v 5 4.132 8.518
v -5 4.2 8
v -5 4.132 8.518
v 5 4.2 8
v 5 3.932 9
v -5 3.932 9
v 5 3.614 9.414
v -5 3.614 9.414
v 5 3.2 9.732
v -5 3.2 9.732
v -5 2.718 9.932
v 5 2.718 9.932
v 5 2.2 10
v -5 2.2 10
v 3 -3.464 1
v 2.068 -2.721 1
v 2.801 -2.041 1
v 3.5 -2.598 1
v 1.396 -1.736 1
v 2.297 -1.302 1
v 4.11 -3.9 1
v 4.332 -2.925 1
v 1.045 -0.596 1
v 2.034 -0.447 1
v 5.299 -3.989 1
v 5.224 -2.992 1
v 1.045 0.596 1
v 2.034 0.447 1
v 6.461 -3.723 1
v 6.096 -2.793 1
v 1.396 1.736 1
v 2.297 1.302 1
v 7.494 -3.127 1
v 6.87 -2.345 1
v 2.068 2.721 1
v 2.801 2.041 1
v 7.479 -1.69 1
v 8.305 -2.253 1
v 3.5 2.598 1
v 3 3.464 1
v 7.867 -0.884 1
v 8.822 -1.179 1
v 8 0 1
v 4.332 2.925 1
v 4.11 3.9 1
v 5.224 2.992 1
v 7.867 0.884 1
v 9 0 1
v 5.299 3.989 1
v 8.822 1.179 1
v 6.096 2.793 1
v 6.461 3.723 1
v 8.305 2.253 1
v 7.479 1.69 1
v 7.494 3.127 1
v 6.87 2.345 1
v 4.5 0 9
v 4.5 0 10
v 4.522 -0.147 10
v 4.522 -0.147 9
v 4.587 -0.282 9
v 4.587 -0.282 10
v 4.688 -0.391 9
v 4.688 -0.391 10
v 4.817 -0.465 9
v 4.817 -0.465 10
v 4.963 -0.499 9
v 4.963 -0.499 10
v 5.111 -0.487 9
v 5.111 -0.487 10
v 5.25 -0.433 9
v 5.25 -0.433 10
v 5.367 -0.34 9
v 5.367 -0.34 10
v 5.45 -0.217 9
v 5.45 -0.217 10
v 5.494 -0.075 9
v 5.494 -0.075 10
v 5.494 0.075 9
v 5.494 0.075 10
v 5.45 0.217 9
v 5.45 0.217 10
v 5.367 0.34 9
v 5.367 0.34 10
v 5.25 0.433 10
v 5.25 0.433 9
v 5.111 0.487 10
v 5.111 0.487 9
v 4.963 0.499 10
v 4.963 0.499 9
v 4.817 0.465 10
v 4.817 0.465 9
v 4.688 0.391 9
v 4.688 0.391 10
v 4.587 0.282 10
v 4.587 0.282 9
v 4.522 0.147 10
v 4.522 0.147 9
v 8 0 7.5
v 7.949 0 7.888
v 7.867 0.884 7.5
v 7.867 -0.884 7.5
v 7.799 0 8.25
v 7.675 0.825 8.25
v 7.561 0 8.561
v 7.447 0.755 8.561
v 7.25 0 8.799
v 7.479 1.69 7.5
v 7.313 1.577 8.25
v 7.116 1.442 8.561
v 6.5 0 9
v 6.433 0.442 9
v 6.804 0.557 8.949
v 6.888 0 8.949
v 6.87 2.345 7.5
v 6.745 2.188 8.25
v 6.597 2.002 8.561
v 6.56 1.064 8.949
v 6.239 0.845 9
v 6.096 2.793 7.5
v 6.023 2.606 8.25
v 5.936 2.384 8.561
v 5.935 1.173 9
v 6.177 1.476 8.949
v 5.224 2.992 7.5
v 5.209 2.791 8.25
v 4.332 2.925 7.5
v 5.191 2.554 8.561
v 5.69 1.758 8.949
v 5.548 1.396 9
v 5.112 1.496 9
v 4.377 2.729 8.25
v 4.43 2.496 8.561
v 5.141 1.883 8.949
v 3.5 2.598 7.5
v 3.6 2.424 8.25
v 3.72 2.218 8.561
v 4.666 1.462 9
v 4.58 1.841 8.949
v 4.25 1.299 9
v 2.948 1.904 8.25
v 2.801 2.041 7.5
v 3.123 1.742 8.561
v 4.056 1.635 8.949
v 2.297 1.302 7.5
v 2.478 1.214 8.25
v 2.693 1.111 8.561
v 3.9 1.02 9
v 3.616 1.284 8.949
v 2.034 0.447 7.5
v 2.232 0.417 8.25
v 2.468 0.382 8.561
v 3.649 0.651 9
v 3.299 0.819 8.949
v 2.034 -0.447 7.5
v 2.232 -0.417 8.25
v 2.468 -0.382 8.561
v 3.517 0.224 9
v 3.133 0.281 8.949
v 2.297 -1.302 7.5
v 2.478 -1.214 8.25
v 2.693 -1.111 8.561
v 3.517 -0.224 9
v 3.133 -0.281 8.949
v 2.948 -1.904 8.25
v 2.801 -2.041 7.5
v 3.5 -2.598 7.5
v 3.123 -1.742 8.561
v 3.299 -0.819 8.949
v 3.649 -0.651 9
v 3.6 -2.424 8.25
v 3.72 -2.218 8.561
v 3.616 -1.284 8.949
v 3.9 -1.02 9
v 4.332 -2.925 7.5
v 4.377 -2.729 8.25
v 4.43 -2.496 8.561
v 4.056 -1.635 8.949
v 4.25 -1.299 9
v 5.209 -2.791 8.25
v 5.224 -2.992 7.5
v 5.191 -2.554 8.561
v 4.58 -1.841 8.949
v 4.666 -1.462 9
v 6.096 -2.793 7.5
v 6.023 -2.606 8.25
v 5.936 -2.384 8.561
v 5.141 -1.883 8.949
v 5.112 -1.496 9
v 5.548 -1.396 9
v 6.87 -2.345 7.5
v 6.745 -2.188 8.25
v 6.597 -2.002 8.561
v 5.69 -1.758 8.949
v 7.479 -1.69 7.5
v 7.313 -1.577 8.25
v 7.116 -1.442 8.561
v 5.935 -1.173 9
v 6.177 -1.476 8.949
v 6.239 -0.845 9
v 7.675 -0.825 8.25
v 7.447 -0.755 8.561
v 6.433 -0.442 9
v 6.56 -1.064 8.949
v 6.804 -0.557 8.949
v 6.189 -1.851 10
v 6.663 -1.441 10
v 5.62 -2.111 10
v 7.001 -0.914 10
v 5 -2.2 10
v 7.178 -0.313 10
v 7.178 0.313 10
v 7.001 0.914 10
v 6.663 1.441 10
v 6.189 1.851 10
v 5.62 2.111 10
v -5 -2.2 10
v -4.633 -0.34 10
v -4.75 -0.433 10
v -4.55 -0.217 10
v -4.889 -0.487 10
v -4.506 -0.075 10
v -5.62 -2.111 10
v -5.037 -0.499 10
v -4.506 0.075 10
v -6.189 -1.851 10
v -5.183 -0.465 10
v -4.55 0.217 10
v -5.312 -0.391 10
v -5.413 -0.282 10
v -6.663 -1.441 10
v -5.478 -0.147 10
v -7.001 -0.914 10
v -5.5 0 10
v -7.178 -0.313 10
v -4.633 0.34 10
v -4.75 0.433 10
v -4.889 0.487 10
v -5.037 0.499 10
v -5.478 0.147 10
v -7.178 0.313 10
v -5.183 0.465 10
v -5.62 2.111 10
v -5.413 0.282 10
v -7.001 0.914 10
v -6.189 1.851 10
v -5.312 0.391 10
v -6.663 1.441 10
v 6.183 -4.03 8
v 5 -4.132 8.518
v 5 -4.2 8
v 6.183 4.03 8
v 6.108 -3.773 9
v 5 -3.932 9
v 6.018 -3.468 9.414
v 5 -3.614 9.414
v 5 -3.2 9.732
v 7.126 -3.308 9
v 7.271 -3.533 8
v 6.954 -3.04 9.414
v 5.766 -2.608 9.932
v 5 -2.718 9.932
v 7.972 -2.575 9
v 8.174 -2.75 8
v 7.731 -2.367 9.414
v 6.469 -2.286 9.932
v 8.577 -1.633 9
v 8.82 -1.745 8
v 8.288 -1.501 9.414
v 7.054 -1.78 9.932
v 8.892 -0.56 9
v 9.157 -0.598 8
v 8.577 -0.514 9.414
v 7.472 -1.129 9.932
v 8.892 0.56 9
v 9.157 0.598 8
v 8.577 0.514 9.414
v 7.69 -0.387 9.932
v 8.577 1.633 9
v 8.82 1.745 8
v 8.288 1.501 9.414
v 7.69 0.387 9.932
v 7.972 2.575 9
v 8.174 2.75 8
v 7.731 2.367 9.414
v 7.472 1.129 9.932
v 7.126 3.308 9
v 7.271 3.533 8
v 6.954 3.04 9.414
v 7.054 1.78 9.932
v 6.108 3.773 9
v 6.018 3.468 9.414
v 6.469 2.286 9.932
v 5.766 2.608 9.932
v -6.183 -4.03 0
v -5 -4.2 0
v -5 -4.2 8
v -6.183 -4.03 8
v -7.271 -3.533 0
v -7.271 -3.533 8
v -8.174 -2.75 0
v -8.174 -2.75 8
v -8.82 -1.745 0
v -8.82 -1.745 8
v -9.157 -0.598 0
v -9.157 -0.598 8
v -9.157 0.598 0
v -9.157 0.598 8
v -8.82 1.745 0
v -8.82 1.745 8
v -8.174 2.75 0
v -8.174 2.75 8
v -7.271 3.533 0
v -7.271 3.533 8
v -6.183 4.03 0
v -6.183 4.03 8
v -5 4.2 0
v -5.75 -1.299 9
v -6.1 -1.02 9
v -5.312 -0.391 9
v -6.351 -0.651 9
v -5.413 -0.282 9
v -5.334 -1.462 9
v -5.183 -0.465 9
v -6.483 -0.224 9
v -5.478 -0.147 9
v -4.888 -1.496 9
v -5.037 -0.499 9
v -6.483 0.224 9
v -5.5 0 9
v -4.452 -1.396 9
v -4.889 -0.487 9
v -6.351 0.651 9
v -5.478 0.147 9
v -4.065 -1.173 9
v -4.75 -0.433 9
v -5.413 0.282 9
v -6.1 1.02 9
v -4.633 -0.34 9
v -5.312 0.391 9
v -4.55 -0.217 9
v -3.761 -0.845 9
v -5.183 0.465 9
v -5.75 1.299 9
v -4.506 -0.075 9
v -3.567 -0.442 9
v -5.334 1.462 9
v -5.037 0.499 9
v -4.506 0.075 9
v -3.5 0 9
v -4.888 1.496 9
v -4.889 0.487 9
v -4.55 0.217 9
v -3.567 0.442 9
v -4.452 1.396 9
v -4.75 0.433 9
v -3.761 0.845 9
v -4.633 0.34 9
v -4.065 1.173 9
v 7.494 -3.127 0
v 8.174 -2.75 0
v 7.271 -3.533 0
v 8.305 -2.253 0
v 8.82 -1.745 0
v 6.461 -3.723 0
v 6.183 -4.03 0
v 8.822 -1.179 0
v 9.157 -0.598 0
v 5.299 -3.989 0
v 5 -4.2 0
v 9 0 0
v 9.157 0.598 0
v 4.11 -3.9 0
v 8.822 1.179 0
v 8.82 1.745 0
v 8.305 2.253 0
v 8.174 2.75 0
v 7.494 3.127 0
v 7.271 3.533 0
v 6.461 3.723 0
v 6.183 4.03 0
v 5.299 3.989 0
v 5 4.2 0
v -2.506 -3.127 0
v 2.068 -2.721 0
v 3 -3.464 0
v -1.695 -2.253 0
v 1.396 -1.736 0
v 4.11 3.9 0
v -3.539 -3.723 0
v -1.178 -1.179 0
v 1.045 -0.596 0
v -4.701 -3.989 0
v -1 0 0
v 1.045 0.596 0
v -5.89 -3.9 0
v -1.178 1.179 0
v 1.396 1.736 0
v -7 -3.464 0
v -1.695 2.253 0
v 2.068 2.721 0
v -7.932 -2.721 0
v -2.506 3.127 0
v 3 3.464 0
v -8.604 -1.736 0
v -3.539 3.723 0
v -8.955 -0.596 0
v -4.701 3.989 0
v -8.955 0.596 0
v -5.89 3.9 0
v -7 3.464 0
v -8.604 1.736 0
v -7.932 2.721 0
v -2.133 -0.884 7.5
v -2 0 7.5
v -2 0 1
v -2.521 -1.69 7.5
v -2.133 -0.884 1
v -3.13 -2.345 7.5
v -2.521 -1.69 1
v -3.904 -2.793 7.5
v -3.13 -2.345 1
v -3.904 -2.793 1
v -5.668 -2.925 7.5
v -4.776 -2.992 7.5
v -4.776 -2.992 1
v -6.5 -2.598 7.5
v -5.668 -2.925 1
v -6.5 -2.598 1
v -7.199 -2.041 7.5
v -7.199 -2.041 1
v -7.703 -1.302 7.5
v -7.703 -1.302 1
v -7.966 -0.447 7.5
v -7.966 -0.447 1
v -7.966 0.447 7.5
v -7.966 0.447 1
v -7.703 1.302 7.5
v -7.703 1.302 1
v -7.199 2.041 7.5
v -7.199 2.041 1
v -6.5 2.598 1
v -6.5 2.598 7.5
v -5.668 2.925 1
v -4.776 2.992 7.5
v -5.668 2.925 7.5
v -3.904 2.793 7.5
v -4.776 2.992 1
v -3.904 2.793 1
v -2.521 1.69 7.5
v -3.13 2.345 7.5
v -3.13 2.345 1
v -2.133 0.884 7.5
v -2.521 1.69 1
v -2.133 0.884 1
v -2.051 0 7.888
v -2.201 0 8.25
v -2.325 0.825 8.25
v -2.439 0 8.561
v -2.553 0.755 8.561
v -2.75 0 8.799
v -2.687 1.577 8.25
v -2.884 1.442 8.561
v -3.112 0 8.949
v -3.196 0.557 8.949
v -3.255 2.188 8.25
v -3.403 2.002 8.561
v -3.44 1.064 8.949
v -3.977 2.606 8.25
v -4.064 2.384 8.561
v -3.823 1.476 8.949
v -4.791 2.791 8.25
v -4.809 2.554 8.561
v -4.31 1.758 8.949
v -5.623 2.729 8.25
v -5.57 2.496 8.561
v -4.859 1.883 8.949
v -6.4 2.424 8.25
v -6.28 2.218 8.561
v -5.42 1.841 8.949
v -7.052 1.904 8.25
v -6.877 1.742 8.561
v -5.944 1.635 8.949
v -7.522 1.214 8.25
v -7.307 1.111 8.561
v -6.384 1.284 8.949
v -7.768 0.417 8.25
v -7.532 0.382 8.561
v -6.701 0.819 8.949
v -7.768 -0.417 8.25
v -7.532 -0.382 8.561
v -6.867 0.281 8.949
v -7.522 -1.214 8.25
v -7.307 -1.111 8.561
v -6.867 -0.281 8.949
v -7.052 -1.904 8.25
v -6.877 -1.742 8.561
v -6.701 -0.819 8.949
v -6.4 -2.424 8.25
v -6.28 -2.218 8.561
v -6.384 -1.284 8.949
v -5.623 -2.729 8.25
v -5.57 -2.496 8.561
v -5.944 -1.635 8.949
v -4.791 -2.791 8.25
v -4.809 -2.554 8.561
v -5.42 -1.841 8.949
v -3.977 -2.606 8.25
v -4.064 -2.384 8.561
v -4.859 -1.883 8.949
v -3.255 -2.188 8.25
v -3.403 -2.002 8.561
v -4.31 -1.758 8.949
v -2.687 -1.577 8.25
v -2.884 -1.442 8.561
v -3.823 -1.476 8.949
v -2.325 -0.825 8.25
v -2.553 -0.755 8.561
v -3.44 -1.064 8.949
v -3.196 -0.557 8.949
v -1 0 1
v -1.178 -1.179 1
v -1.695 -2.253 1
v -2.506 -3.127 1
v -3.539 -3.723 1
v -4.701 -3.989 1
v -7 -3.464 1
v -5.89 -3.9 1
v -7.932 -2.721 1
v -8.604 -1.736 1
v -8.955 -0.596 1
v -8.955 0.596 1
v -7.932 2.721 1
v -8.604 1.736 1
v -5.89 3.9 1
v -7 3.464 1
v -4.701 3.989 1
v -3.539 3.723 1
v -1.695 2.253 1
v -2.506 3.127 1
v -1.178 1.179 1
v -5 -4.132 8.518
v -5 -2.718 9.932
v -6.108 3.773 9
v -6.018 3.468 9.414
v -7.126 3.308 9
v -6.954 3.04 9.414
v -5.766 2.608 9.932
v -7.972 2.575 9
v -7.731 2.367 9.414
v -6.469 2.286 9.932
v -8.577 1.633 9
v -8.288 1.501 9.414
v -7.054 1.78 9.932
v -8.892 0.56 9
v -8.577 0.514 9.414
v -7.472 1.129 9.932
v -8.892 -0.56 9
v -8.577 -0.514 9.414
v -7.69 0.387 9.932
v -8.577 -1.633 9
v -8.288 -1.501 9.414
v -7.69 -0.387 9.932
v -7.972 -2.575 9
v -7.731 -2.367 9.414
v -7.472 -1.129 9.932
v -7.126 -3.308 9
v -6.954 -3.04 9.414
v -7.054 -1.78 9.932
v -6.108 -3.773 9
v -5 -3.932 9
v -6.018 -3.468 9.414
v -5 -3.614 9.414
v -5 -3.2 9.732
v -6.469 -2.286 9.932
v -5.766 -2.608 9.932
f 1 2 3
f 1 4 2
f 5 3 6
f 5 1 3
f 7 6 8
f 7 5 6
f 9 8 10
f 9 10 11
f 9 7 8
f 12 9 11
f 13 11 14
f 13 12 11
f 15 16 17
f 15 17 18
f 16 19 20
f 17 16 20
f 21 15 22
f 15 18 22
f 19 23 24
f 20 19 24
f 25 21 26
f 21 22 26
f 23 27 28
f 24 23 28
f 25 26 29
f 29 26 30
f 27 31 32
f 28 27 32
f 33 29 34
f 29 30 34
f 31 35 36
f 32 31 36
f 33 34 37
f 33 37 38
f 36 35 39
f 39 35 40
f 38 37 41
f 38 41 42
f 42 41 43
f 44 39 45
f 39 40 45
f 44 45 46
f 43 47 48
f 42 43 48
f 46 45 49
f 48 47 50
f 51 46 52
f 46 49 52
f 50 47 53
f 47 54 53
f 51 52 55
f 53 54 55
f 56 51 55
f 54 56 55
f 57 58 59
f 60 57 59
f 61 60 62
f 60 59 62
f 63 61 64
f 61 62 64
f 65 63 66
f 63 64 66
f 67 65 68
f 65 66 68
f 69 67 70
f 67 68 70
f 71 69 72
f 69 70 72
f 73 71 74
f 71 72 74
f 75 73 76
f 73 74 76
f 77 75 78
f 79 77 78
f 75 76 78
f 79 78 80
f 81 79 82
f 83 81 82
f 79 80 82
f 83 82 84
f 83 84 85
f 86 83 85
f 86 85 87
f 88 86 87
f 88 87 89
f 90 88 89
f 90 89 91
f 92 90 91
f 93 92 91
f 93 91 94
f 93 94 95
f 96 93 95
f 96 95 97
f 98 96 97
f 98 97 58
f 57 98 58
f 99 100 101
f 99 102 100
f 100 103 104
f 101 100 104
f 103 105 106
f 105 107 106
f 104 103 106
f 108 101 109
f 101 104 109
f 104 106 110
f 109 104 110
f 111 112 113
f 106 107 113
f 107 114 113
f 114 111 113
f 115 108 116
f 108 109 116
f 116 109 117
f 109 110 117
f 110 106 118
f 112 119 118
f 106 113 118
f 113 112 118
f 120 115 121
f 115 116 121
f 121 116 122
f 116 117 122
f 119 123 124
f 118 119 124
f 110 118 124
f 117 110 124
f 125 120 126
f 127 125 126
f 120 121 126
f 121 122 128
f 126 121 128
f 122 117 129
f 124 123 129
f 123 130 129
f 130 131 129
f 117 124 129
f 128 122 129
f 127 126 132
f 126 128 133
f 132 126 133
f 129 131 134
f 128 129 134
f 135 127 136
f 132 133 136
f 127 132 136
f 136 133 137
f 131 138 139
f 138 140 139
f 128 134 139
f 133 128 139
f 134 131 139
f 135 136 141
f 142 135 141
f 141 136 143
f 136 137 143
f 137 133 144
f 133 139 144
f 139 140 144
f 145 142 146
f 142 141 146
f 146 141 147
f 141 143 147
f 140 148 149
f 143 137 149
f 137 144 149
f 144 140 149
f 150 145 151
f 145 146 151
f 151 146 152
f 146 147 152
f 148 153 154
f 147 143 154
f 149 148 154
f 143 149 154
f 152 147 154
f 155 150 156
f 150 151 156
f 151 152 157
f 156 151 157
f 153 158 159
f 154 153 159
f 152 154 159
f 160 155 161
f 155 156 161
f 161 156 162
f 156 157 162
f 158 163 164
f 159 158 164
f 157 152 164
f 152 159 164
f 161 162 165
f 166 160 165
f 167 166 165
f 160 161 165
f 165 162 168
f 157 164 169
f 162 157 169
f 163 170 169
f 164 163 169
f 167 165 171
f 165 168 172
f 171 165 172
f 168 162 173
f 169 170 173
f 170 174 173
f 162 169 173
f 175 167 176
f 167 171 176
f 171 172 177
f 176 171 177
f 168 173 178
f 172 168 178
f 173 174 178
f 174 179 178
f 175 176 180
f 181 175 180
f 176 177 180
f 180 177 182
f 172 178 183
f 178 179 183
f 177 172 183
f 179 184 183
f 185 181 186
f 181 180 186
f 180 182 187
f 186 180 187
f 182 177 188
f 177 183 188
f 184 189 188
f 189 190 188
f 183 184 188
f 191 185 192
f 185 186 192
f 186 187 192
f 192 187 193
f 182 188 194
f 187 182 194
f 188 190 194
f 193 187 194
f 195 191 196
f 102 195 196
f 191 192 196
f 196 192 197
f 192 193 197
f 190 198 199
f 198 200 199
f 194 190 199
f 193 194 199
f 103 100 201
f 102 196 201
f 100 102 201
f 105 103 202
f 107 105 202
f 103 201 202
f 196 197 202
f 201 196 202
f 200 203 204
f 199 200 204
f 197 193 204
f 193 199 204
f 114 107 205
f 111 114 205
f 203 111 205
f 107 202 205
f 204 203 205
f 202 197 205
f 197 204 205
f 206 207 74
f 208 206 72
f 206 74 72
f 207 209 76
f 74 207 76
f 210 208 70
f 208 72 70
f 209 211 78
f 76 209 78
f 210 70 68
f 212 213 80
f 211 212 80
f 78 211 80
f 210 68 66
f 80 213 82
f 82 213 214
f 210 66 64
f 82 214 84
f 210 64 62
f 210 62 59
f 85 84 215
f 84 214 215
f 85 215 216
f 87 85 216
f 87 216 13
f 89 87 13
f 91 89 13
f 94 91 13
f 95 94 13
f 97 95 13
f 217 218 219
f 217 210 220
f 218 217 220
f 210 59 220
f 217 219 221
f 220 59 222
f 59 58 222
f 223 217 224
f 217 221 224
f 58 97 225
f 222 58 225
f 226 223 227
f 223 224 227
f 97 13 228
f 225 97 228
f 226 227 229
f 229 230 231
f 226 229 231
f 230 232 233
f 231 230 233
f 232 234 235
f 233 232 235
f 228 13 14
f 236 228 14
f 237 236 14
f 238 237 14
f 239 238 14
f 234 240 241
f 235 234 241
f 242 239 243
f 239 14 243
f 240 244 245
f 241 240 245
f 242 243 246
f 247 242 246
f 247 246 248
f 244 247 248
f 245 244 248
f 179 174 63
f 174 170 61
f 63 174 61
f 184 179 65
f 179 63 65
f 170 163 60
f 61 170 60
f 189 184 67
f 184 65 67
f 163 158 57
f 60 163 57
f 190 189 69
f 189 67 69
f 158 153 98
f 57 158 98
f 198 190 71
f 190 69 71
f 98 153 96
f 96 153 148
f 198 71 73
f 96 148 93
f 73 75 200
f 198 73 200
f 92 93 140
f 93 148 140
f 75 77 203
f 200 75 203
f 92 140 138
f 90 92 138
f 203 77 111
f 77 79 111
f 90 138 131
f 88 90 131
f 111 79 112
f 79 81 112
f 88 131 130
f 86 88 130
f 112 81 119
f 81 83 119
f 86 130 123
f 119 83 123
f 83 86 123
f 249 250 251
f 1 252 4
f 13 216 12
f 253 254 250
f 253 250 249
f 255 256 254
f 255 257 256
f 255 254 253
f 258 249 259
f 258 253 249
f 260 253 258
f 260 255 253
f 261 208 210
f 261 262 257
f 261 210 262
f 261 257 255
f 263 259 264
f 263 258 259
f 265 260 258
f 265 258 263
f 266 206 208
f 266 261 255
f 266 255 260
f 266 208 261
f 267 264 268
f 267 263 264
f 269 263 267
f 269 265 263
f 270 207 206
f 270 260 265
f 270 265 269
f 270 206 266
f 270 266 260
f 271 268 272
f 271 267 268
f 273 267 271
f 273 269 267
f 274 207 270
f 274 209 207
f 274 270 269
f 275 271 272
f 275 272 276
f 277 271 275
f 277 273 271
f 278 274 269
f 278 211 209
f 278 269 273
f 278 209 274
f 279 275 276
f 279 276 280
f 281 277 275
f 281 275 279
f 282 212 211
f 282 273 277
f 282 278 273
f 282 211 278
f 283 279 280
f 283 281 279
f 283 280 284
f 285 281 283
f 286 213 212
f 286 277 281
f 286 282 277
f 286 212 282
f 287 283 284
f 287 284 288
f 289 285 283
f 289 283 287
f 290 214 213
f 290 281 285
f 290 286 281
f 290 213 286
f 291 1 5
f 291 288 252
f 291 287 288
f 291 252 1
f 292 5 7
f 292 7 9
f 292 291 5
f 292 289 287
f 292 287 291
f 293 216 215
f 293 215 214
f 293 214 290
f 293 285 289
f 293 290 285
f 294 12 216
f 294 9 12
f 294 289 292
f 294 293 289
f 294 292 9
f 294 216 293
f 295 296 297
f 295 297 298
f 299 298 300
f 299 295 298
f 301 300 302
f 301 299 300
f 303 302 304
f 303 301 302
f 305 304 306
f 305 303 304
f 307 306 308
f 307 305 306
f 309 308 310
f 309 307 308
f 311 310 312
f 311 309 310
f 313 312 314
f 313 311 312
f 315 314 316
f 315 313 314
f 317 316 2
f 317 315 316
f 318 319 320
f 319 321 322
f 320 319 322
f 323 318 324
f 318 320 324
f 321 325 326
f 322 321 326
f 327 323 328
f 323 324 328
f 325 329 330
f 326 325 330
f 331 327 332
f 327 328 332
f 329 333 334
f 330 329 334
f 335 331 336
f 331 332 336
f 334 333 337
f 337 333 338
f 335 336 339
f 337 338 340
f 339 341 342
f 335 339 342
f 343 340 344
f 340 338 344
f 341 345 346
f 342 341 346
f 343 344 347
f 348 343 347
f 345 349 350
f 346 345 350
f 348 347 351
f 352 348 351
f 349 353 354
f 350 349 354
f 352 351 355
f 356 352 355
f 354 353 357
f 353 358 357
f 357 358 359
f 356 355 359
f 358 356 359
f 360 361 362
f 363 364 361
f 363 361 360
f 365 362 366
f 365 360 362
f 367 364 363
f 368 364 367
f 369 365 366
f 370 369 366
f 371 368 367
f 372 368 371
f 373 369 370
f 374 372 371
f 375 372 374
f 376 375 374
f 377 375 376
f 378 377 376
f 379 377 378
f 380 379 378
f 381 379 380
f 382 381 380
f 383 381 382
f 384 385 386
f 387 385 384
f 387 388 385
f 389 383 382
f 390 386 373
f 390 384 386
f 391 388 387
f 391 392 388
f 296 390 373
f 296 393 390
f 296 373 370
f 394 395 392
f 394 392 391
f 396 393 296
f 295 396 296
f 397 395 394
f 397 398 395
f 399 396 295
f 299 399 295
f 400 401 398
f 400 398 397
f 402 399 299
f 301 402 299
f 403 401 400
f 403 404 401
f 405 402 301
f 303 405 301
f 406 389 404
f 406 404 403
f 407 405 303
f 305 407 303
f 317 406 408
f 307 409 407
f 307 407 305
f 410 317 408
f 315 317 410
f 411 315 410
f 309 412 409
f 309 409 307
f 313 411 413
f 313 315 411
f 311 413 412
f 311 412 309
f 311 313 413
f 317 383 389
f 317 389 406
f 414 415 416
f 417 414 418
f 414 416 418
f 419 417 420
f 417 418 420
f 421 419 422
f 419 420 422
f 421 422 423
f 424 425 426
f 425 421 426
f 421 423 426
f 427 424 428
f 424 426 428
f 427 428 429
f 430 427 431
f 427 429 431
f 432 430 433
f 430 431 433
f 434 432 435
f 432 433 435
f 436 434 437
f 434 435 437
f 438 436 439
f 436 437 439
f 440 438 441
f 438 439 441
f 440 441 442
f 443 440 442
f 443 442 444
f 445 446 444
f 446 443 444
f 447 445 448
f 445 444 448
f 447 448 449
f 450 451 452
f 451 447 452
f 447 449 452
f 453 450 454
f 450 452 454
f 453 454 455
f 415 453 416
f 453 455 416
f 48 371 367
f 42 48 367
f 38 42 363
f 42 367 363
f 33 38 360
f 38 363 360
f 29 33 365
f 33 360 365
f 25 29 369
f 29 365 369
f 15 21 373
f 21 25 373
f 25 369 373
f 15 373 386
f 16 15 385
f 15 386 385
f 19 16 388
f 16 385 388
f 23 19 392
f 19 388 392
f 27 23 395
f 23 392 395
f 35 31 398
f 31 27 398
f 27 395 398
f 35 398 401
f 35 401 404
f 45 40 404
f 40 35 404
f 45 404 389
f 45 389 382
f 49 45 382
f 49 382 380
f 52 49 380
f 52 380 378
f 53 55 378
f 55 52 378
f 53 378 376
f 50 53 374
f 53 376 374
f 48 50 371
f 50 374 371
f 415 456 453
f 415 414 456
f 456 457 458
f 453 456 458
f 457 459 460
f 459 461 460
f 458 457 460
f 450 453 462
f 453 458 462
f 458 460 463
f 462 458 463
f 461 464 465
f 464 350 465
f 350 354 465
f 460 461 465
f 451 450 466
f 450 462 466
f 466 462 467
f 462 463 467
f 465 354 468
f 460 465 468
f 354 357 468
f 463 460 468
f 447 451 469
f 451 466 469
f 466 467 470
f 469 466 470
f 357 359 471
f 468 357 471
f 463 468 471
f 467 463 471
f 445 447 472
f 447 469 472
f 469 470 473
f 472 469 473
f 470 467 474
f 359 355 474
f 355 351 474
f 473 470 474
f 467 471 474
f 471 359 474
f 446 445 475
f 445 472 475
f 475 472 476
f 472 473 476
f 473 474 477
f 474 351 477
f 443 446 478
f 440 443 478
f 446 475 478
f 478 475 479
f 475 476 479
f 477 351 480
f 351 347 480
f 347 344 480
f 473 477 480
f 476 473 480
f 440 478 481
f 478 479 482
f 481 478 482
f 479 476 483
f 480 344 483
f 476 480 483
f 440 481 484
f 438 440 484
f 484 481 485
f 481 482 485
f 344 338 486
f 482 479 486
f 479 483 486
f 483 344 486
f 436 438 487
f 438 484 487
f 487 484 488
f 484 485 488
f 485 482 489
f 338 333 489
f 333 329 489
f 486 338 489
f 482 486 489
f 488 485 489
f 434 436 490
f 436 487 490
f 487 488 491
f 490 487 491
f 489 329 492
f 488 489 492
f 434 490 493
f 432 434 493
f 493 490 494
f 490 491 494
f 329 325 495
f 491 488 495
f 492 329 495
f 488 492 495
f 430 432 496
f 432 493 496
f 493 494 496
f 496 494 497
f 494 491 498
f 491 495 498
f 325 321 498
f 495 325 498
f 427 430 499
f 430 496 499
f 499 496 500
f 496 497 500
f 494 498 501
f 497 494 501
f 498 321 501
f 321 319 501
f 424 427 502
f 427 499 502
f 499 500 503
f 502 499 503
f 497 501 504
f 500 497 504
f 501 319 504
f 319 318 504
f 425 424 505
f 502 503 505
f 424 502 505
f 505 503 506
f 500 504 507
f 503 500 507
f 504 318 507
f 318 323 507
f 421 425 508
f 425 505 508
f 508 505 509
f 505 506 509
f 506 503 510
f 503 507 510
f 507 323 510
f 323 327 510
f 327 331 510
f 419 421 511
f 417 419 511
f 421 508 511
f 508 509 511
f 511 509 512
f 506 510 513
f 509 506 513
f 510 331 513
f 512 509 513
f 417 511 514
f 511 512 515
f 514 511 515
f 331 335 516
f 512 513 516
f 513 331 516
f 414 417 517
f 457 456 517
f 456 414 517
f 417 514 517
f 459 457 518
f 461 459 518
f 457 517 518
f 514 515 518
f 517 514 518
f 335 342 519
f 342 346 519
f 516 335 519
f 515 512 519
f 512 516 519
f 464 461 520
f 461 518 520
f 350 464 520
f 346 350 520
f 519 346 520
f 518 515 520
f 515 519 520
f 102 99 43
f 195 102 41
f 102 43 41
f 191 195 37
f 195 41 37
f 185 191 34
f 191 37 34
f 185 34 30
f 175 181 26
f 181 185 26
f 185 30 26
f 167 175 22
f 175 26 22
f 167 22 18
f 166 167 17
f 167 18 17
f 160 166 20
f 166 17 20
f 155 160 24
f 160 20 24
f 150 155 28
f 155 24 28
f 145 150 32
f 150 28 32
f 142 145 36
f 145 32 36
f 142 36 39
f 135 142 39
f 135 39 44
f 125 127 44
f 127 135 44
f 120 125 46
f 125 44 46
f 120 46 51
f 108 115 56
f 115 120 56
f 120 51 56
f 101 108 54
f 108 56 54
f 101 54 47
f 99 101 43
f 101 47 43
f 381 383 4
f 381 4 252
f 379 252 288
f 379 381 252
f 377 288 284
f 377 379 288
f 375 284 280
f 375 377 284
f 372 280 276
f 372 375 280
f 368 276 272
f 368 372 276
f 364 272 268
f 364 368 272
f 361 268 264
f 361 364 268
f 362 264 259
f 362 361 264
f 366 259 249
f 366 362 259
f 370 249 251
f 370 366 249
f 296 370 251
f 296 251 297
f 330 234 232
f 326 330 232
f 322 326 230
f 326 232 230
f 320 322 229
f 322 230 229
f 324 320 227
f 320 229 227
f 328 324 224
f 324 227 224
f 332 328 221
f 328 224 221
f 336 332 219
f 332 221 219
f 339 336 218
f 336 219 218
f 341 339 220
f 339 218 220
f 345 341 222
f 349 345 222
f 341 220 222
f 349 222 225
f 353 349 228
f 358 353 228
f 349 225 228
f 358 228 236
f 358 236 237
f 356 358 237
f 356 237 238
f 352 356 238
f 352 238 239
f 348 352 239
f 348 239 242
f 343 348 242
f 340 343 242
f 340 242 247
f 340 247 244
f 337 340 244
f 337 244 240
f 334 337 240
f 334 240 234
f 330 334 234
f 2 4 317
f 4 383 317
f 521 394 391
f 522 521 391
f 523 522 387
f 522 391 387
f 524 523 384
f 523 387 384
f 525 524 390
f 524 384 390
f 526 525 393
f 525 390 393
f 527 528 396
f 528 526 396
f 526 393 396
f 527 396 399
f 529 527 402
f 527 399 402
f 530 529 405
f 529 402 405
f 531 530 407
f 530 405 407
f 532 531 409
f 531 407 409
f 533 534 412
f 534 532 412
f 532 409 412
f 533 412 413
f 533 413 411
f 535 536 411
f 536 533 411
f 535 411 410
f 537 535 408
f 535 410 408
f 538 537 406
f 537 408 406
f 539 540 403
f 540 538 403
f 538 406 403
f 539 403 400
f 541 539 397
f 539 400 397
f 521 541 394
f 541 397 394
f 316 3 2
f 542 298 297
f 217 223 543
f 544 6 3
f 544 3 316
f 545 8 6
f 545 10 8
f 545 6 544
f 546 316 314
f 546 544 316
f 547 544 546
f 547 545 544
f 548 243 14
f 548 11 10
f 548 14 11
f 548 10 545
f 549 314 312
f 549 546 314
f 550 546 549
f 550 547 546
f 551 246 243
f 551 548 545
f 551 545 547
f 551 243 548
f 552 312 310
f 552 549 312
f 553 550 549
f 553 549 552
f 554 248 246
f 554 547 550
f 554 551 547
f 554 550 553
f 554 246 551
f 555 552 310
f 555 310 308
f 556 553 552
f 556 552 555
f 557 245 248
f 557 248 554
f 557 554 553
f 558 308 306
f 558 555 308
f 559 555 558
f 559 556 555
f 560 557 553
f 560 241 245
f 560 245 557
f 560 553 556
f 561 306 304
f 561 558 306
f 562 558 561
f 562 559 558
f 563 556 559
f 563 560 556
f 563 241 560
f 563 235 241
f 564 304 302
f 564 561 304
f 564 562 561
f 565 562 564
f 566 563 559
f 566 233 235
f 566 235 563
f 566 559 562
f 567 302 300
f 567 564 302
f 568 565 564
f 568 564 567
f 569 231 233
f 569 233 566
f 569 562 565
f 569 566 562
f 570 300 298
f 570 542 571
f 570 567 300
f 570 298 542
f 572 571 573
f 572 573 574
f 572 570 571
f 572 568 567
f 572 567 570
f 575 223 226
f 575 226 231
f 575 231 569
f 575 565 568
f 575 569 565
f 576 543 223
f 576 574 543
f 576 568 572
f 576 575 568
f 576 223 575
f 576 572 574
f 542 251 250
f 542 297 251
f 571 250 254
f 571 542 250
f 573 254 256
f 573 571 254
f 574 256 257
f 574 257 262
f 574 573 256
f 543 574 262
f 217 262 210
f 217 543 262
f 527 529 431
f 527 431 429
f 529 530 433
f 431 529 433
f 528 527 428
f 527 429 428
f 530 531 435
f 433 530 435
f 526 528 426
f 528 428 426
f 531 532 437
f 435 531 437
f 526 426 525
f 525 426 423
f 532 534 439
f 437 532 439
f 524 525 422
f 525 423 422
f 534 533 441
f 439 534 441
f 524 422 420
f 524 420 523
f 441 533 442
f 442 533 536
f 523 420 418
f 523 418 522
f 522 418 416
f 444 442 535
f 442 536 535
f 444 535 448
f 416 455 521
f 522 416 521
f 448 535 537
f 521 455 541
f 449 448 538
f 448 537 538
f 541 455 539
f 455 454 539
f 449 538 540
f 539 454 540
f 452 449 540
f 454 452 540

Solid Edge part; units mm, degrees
sketch "Sketch1" plane through (0, 0, 0) normal (0, 0, 1) x (1, 0, 0)
  line L0 (5, -4.2) -> (-5, -4.2)
  line L1 (5, 4.2) -> (-5, 4.2)
  arc A0 (-5, -4.2) -> (-5, 4.2) centre (-5, 0) cw
  arc A1 (5, 4.2) -> (5, -4.2) centre (5, 0) cw
extrude "Protrusion1" add sketch "Sketch1" along normal blind 10
sketch "Sketch2" plane through (0, 0, 0) normal (0, 0, 1) x (1, 0, 0)
  circle A0 centre (5, 0) radius 3
  circle A1 centre (-5, 0) radius 3
  dimension "D1" = 10
  dimension "D2" = 8
  dimension "D3" = 8
  dimension "D4" = 6
  dimension "D5" = 6
extrude "VaciadoExtruido_1" cut sketch "Sketch2" along normal blind 9
sketch "Sketch3" plane through (0, 0, 0) normal (0, 0, 1) x (1, 0, 0)
  circle A0 centre (5, 0) radius 4
  circle A1 centre (-5, 0) radius 4
  dimension "D1" = 10
  dimension "D2" = 8
  dimension "D3" = 8
  dimension "D4" = 6
  dimension "D5" = 6
extrude "VaciadoExtruido_2" cut sketch "Sketch3" along normal blind 1
fillet "Redondeo_1" radius 1.5 2 edges at (2, 0, 9) (-8, 0, 9)
fillet "Redondeo_2" radius 2 4 edges at (-9.2, 0, 10) (9.2, 0, 10) (0, -4.2, 10) (0, 4.2, 10)
sketch "Sketch4" plane through (0, 0, 10) normal (0, 0, 1) x (-1, 0, 0)
  circle A0 centre (-5, 0) radius 0.5
  circle A1 centre (5, 0) radius 0.5
extrude "Cutout1" cut sketch "Sketch4" against normal through all
